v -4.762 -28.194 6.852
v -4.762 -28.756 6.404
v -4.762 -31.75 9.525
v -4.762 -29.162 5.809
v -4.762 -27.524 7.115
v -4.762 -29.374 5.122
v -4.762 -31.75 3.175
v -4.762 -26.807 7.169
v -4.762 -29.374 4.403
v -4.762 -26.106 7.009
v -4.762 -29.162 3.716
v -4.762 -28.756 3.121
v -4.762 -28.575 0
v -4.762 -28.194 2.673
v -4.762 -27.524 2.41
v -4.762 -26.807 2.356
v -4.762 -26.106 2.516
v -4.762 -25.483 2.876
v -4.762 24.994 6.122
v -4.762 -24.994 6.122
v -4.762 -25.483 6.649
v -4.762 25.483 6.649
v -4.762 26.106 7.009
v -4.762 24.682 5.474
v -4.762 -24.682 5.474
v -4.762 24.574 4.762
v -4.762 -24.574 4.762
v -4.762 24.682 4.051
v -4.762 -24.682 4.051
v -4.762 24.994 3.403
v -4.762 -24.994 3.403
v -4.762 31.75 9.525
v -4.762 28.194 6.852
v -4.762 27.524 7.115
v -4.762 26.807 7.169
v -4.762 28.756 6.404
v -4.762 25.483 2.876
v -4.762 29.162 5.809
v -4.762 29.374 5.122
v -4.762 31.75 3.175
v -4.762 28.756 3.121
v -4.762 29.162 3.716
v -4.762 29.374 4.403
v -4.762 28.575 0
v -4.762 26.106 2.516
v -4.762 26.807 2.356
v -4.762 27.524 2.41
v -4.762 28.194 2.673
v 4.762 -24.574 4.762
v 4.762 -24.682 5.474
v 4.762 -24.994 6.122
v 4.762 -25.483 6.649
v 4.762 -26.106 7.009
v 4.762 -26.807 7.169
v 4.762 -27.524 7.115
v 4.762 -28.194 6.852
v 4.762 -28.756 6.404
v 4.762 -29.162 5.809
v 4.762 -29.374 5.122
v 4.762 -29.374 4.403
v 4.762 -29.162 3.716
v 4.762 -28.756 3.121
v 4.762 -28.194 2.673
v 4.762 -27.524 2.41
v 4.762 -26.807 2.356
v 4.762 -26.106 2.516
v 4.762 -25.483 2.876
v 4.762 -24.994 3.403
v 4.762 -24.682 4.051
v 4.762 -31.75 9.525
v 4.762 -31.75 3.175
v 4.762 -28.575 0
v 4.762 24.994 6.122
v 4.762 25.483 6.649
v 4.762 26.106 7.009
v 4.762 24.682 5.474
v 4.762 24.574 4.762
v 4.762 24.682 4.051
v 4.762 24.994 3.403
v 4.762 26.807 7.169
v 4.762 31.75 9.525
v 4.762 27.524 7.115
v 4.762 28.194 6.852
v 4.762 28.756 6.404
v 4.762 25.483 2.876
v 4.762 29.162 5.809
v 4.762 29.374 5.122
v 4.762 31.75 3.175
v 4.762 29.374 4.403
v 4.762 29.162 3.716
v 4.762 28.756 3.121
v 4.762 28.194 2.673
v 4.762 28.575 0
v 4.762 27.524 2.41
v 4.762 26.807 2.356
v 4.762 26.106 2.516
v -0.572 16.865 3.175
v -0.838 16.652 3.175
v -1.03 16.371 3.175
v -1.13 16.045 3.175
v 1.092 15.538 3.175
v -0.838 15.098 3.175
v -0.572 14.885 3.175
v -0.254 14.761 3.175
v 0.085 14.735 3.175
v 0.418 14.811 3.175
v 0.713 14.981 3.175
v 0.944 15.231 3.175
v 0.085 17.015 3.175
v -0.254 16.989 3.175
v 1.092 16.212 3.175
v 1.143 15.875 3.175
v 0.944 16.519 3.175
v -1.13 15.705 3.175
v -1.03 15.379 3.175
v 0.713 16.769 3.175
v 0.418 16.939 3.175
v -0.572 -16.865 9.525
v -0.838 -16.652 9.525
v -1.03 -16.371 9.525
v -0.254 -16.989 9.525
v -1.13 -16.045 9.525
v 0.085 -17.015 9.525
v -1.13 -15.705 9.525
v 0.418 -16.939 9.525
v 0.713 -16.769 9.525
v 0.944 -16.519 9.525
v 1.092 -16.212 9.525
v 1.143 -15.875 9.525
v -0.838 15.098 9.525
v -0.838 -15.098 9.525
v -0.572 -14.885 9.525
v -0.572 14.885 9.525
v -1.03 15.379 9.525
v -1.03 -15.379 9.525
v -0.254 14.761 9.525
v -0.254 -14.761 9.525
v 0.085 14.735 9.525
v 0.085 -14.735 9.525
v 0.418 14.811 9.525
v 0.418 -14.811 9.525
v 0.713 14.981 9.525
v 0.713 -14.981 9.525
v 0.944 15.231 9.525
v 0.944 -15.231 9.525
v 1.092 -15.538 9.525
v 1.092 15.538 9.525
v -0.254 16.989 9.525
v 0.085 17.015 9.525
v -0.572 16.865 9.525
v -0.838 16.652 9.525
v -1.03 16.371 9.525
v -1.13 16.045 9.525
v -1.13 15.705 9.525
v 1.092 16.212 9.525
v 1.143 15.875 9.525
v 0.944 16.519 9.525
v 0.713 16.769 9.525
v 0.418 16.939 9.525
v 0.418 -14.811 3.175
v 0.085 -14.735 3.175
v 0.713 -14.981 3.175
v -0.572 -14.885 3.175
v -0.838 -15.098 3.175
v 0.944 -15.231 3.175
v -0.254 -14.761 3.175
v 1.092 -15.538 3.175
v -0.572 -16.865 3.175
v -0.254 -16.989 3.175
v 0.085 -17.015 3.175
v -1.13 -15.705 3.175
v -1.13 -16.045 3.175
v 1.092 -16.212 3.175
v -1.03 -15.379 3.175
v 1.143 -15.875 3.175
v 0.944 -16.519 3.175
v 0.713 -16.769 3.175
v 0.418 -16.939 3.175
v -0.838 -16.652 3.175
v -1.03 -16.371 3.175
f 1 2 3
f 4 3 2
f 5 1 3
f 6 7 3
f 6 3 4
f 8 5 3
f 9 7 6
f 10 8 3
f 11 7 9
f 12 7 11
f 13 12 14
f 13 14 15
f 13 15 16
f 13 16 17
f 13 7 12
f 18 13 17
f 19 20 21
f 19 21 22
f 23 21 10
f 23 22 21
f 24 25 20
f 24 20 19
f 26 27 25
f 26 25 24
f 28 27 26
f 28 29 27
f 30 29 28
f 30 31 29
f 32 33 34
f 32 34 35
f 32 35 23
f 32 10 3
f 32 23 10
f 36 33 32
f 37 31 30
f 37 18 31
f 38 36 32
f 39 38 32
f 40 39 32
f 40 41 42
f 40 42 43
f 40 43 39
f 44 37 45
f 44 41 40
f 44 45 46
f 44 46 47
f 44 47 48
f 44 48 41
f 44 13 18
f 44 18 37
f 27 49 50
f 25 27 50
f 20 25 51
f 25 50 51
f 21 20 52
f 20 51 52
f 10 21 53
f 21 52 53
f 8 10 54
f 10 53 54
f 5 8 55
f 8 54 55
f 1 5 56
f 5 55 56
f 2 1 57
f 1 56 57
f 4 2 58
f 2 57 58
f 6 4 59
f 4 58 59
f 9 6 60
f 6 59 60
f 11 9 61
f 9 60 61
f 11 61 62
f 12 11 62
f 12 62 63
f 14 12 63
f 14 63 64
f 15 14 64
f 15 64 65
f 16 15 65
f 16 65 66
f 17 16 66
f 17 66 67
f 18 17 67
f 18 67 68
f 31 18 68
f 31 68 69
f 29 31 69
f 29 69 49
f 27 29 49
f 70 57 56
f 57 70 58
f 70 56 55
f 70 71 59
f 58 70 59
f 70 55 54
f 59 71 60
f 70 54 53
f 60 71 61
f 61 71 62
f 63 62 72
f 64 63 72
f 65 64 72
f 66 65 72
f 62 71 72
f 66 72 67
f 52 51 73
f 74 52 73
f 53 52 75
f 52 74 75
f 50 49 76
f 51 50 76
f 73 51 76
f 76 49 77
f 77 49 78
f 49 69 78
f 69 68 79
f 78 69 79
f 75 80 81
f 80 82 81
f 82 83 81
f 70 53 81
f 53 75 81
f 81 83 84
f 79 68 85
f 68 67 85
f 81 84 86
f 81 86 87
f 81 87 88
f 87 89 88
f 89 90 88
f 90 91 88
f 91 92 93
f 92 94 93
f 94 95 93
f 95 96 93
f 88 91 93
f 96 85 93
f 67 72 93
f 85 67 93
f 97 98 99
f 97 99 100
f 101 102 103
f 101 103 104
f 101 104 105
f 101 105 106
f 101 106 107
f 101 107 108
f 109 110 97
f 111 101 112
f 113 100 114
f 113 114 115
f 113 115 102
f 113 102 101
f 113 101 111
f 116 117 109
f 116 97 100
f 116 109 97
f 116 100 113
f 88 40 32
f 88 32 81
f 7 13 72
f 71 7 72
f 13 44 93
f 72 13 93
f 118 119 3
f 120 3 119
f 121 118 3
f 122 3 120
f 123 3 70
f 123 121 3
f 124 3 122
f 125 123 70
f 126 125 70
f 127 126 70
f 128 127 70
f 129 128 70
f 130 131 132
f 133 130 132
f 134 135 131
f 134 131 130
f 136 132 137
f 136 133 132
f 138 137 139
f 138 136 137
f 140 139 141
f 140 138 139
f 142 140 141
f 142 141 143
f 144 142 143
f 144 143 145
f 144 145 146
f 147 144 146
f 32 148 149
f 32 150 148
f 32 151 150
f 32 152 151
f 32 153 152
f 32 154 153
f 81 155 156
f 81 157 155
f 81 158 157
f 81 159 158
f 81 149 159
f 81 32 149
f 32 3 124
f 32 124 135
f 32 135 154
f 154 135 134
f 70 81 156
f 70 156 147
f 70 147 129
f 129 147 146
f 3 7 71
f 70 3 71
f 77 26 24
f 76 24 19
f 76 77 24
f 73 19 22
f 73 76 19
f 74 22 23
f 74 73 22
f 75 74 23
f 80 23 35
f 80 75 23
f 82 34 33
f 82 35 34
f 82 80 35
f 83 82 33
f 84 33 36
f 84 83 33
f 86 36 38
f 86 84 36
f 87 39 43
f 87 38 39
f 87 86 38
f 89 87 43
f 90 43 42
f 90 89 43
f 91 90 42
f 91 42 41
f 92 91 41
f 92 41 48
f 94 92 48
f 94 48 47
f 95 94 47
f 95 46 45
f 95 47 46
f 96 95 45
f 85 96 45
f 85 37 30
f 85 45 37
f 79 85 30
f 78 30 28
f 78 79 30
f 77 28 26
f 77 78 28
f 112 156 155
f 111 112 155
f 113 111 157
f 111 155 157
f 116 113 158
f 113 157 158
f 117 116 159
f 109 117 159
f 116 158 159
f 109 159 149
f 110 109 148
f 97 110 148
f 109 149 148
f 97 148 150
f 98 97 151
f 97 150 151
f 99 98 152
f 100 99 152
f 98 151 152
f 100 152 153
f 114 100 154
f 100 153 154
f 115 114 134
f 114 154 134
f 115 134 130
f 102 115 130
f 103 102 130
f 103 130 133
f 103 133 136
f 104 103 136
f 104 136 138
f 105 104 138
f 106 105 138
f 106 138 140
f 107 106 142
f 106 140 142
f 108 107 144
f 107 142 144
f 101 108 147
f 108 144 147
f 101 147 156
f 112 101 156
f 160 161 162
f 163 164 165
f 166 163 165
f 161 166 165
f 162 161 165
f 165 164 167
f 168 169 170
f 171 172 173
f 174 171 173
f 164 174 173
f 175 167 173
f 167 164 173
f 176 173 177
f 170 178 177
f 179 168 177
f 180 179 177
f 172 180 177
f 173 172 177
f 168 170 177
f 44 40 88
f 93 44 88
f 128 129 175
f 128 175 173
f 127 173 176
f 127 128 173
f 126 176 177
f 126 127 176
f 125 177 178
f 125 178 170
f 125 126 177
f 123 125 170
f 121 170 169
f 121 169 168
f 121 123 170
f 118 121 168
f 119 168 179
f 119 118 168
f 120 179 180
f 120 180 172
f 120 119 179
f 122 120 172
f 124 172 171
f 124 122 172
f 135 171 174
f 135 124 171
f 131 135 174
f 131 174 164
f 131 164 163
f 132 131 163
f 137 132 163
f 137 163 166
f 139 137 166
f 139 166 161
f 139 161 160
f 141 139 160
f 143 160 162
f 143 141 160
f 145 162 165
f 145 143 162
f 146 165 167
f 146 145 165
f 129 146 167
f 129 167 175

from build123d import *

# Parameters (mm, degrees)
F0_W     = 9.525
F0_H     = 63.5
F1_DEPTH = 9.525
F2_R     = 2.413
F3_DEPTH = 9.526
F4_R     = 1.143
F5_DEPTH = 6.35
F6_SIZE  = 3.175


# Not quite as in the source:
# - a pattern or mirror of a feature is missing from the dataset's text; its kind, count and spacing are read off the source's solid


with BuildPart() as f1:
    # F0 (on Top) → F1 (new body)
    with BuildSketch(Plane.XY):
        Rectangle(F0_W, F0_H)
    extrude(amount=F1_DEPTH)

    # F2 (on face) → F3 (cut, through all)
    with BuildSketch(Plane.YZ.offset(4.7625)):
        with Locations((-26.9875, 4.7625)):
            Circle(F2_R)
    f3 = extrude(amount=-F3_DEPTH, mode=Mode.SUBTRACT)

    # F3_copies: F3 across plane
    add(f3.mirror(Plane.ZX), mode=Mode.SUBTRACT)

    # F4 (on face) → F5 (cut)
    with BuildSketch(Plane.XY.offset(9.525)):
        with Locations((0, 15.875)):
            Circle(F4_R)
    f5 = extrude(amount=-F5_DEPTH, mode=Mode.SUBTRACT)

    # F5_copies: F5 across plane
    add(f5.mirror(Plane(origin=(0, 0, 0), x_dir=(0, 0, -1), z_dir=(0, -1, 0))), mode=Mode.SUBTRACT)

    # F6
    f6_edges = [f1.edges().sort_by_distance(p)[0] for p in [
        (0, -31.75, 0),
        (0, 31.75, 0),
    ]]
    chamfer(f6_edges, length=F6_SIZE)


solid = f1.part
